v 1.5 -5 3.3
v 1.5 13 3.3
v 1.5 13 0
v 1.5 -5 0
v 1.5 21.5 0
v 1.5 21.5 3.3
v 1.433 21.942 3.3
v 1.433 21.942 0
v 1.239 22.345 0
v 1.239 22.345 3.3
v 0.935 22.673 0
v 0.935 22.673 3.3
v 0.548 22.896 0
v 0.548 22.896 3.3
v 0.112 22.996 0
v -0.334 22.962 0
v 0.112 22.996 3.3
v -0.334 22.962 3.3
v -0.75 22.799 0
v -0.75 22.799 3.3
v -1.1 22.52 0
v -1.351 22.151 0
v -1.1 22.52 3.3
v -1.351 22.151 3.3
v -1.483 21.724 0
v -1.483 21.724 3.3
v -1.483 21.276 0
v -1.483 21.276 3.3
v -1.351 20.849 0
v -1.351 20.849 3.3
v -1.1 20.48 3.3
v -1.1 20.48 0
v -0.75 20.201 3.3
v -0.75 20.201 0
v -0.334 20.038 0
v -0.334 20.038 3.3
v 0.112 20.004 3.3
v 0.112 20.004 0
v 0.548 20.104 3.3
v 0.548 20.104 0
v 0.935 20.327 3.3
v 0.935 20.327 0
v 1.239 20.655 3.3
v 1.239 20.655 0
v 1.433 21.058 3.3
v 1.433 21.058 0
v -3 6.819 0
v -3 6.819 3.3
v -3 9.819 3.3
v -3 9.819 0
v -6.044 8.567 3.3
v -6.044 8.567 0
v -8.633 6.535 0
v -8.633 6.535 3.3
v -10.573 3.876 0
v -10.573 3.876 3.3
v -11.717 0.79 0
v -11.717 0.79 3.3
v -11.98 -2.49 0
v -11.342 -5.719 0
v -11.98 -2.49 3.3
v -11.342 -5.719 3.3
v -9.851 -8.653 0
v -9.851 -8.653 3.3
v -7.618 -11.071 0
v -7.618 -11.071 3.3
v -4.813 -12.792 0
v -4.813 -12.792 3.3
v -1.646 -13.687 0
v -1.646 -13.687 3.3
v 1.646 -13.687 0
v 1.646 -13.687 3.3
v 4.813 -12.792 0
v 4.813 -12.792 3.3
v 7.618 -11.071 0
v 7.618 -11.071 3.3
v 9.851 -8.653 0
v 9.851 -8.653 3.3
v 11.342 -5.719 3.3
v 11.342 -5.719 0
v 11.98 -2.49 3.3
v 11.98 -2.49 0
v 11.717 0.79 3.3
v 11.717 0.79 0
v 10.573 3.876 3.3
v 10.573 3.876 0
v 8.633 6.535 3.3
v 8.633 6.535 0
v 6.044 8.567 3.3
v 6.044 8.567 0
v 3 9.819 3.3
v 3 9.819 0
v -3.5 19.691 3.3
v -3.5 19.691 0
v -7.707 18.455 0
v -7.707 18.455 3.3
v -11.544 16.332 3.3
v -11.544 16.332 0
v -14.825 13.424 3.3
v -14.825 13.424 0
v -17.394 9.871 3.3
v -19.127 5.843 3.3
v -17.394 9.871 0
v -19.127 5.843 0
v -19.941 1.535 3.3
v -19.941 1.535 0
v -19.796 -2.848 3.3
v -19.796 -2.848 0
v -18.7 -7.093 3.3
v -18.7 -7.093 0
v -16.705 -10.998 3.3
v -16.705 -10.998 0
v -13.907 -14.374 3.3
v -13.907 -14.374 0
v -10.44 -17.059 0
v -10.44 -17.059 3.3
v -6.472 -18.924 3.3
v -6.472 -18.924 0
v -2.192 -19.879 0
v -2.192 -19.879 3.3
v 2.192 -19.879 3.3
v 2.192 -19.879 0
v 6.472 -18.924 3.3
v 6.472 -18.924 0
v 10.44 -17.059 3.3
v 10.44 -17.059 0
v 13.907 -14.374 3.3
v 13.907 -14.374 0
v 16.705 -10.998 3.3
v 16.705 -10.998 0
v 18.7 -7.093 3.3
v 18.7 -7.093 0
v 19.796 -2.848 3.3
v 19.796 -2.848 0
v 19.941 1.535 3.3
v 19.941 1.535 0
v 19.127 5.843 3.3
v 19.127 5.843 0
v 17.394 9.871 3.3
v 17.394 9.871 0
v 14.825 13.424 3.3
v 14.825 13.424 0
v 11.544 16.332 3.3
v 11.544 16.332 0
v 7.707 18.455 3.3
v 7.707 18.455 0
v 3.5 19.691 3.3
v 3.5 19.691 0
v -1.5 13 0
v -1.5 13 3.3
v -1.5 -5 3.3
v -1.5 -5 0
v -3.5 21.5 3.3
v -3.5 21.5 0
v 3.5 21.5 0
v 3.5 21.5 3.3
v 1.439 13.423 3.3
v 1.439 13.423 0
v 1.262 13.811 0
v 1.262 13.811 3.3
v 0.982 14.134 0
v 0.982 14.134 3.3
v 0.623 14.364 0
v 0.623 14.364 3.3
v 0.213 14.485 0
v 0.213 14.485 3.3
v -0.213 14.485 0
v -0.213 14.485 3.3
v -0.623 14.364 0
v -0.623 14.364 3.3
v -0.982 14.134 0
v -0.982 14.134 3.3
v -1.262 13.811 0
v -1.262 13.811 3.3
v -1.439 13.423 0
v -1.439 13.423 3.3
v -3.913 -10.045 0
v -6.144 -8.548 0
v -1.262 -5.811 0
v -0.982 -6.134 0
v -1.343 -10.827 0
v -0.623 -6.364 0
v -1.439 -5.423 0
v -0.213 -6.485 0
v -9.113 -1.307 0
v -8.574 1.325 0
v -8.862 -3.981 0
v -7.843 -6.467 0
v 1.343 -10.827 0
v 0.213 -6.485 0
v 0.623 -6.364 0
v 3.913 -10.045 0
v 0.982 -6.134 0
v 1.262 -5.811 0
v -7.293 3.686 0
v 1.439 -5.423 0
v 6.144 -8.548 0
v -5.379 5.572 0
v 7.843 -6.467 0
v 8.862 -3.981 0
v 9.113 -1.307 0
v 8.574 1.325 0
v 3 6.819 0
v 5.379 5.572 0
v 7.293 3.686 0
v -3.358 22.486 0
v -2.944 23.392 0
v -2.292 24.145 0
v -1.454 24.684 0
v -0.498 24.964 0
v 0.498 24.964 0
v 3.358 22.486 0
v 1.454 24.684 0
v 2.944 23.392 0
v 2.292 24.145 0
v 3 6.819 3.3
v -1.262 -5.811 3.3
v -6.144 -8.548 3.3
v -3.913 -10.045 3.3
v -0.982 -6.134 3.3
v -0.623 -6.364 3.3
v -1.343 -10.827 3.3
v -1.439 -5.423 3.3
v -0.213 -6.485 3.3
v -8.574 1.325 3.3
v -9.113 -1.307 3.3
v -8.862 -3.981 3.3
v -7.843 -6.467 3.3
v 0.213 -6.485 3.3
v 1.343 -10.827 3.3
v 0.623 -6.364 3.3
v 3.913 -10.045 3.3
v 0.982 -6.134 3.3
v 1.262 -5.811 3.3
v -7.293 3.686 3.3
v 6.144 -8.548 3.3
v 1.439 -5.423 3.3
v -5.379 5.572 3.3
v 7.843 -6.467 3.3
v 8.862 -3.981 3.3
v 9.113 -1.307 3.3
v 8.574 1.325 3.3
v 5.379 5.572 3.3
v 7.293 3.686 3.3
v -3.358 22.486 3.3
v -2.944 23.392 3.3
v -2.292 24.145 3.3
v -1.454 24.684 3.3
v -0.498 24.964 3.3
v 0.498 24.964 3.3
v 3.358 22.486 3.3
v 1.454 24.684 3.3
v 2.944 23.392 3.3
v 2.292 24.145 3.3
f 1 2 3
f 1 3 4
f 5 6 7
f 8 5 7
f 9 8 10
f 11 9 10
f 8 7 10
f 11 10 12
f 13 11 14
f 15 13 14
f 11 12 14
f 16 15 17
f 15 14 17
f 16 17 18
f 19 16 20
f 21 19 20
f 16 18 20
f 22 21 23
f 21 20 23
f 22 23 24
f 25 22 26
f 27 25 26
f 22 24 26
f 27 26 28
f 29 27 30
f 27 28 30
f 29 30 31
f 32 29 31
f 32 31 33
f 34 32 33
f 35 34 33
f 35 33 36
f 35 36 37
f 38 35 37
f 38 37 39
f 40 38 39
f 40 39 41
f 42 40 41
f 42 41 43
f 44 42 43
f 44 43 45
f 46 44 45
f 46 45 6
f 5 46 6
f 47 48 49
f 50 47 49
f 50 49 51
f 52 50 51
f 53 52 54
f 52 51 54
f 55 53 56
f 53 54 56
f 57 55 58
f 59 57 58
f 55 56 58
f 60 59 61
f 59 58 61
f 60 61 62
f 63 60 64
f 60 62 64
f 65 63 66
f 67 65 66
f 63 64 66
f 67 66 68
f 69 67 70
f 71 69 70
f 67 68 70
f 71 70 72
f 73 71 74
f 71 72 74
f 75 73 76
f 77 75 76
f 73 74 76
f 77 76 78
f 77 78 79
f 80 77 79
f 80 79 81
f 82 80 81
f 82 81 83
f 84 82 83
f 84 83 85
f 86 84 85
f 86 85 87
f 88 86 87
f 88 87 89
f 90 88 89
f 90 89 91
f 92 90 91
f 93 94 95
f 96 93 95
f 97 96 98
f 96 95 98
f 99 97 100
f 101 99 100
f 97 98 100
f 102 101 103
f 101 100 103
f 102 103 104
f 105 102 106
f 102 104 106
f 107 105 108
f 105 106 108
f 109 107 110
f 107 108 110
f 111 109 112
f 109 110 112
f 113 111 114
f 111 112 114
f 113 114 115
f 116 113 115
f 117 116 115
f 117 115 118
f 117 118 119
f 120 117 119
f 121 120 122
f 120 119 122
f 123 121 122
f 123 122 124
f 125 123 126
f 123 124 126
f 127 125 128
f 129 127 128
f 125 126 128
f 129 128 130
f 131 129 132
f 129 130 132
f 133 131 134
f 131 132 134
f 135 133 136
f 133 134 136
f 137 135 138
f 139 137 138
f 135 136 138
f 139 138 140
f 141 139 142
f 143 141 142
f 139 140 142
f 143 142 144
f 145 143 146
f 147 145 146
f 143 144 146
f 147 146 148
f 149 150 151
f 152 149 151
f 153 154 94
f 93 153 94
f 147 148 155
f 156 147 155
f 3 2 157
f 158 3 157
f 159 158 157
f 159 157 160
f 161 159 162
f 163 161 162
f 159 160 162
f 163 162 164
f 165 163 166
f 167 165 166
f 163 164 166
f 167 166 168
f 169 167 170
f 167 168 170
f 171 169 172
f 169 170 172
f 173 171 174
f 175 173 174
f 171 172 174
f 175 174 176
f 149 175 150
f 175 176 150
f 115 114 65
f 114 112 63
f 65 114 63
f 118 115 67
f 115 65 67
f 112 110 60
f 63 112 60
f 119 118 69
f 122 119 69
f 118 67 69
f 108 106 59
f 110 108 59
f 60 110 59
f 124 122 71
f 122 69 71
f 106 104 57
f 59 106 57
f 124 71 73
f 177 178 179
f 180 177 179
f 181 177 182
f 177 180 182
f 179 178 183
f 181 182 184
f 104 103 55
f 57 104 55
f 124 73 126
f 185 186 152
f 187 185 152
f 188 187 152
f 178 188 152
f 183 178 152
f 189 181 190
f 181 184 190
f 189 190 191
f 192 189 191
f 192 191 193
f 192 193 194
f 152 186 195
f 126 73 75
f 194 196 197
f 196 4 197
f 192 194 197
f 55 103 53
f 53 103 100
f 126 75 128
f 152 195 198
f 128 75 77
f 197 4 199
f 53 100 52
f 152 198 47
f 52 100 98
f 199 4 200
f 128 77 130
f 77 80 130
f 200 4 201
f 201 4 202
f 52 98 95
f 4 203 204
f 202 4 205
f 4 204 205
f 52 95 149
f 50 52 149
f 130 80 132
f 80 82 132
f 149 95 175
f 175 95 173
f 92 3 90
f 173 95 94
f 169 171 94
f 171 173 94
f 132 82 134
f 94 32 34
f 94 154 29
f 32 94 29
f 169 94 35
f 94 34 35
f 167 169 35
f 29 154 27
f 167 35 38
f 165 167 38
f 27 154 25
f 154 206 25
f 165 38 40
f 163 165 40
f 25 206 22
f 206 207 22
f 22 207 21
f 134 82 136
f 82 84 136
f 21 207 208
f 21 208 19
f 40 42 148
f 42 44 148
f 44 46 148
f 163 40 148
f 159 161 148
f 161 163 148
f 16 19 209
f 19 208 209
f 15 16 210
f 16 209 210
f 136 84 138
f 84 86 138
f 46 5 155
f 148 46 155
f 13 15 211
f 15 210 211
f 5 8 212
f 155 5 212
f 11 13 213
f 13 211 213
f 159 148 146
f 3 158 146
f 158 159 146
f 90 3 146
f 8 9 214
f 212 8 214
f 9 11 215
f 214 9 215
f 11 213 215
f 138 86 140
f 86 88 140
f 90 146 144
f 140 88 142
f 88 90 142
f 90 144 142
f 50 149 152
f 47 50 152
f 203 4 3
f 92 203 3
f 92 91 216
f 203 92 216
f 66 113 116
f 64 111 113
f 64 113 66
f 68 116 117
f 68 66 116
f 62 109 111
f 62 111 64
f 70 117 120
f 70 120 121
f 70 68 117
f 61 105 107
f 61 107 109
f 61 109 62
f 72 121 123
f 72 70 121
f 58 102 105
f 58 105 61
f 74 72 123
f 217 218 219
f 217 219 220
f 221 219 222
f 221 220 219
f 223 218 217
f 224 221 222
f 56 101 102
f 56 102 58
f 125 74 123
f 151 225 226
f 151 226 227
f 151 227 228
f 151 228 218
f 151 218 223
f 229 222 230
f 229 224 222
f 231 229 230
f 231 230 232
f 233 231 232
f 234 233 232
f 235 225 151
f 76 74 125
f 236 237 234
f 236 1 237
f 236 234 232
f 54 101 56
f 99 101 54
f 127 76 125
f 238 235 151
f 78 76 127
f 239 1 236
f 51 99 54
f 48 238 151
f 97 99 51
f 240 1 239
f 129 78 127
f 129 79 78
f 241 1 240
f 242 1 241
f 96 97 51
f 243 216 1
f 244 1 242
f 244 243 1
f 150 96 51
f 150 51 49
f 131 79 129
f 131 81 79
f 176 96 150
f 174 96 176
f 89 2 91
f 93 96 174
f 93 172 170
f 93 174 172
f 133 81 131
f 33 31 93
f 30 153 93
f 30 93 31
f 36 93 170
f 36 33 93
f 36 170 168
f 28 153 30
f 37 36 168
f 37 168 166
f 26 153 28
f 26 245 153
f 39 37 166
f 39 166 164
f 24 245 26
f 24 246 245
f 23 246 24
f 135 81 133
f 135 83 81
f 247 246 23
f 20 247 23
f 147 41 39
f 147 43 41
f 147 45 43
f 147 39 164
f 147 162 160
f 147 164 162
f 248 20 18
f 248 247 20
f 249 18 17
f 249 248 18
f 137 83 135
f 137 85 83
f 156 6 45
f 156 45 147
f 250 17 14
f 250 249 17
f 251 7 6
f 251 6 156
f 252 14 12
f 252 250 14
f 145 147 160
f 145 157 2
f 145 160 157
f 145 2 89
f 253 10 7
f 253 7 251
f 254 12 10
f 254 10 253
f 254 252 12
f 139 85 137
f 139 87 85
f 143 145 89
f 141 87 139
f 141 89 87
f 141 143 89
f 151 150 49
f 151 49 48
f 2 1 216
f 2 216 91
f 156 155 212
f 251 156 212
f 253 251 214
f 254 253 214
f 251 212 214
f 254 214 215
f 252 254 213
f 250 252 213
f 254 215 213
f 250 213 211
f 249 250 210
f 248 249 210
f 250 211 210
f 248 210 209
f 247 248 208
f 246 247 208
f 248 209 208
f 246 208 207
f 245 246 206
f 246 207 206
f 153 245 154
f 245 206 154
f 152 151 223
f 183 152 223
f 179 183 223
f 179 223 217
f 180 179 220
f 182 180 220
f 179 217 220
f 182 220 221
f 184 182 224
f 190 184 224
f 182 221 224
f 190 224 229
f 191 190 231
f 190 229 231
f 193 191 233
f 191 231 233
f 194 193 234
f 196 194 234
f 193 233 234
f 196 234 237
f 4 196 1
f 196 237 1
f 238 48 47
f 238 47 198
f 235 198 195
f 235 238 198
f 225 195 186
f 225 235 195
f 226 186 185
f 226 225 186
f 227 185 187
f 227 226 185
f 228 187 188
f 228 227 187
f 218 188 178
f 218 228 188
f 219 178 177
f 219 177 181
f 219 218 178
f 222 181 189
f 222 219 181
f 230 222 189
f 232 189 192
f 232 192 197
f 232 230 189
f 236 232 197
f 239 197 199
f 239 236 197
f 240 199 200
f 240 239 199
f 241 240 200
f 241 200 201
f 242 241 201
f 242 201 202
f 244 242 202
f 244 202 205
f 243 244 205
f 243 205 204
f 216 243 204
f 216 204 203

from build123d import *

# Parameters (mm, degrees)
EXTRUDE_DEPTH   = 3.3
SKETCH001_R     = 1.5
POCKET_DEPTH    = 3.301
POCKET001_DEPTH = 3.301


with BuildPart() as part:
    # Sketch → Extrude (new body)
    with BuildSketch(Plane.XY):
        with BuildLine():
            ThreePointArc((3.5, 21.5), (0, 25), (-3.5, 21.5))
            Line((-3.5, 21.5), (-3.5, 19.691369))
            ThreePointArc((-3.5, 19.691369), (0, -20), (3.5, 19.691369))
            Line((3.5, 19.691369), (3.5, 21.5))
        make_face()
    extrude(amount=EXTRUDE_DEPTH)

    # Sketch001 (on Face6 of Extrude) → Pocket (cut, through all)
    with BuildSketch(Plane.XY.offset(3.3)):
        with Locations((0, 21.5)):
            Circle(SKETCH001_R)
    extrude(amount=-POCKET_DEPTH, mode=Mode.SUBTRACT)

    # Sketch002 (on Face6 of BaseFeature) → Pocket001 (cut, through all)
    with BuildSketch(Plane.XY.offset(3.3)):
        with BuildLine():
            Line((-1.5, 13), (-1.5, -5))
            ThreePointArc((-1.5, -5), (0, -6.5), (1.5, -5))
            Line((1.5, 13), (1.5, -5))
            ThreePointArc((1.5, 13), (0, 14.5), (-1.5, 13))
        make_face()
        with BuildLine():
            ThreePointArc((-3, 6.81895), (0, -10.926133), (3, 6.81895))
            Line((3, 9.81895), (3, 6.81895))
            ThreePointArc((-3, 9.81895), (0, -13.8), (3, 9.81895))
            Line((-3, 6.81895), (-3, 9.81895))
        make_face()
    extrude(amount=-POCKET001_DEPTH, mode=Mode.SUBTRACT)


solid = part.part
